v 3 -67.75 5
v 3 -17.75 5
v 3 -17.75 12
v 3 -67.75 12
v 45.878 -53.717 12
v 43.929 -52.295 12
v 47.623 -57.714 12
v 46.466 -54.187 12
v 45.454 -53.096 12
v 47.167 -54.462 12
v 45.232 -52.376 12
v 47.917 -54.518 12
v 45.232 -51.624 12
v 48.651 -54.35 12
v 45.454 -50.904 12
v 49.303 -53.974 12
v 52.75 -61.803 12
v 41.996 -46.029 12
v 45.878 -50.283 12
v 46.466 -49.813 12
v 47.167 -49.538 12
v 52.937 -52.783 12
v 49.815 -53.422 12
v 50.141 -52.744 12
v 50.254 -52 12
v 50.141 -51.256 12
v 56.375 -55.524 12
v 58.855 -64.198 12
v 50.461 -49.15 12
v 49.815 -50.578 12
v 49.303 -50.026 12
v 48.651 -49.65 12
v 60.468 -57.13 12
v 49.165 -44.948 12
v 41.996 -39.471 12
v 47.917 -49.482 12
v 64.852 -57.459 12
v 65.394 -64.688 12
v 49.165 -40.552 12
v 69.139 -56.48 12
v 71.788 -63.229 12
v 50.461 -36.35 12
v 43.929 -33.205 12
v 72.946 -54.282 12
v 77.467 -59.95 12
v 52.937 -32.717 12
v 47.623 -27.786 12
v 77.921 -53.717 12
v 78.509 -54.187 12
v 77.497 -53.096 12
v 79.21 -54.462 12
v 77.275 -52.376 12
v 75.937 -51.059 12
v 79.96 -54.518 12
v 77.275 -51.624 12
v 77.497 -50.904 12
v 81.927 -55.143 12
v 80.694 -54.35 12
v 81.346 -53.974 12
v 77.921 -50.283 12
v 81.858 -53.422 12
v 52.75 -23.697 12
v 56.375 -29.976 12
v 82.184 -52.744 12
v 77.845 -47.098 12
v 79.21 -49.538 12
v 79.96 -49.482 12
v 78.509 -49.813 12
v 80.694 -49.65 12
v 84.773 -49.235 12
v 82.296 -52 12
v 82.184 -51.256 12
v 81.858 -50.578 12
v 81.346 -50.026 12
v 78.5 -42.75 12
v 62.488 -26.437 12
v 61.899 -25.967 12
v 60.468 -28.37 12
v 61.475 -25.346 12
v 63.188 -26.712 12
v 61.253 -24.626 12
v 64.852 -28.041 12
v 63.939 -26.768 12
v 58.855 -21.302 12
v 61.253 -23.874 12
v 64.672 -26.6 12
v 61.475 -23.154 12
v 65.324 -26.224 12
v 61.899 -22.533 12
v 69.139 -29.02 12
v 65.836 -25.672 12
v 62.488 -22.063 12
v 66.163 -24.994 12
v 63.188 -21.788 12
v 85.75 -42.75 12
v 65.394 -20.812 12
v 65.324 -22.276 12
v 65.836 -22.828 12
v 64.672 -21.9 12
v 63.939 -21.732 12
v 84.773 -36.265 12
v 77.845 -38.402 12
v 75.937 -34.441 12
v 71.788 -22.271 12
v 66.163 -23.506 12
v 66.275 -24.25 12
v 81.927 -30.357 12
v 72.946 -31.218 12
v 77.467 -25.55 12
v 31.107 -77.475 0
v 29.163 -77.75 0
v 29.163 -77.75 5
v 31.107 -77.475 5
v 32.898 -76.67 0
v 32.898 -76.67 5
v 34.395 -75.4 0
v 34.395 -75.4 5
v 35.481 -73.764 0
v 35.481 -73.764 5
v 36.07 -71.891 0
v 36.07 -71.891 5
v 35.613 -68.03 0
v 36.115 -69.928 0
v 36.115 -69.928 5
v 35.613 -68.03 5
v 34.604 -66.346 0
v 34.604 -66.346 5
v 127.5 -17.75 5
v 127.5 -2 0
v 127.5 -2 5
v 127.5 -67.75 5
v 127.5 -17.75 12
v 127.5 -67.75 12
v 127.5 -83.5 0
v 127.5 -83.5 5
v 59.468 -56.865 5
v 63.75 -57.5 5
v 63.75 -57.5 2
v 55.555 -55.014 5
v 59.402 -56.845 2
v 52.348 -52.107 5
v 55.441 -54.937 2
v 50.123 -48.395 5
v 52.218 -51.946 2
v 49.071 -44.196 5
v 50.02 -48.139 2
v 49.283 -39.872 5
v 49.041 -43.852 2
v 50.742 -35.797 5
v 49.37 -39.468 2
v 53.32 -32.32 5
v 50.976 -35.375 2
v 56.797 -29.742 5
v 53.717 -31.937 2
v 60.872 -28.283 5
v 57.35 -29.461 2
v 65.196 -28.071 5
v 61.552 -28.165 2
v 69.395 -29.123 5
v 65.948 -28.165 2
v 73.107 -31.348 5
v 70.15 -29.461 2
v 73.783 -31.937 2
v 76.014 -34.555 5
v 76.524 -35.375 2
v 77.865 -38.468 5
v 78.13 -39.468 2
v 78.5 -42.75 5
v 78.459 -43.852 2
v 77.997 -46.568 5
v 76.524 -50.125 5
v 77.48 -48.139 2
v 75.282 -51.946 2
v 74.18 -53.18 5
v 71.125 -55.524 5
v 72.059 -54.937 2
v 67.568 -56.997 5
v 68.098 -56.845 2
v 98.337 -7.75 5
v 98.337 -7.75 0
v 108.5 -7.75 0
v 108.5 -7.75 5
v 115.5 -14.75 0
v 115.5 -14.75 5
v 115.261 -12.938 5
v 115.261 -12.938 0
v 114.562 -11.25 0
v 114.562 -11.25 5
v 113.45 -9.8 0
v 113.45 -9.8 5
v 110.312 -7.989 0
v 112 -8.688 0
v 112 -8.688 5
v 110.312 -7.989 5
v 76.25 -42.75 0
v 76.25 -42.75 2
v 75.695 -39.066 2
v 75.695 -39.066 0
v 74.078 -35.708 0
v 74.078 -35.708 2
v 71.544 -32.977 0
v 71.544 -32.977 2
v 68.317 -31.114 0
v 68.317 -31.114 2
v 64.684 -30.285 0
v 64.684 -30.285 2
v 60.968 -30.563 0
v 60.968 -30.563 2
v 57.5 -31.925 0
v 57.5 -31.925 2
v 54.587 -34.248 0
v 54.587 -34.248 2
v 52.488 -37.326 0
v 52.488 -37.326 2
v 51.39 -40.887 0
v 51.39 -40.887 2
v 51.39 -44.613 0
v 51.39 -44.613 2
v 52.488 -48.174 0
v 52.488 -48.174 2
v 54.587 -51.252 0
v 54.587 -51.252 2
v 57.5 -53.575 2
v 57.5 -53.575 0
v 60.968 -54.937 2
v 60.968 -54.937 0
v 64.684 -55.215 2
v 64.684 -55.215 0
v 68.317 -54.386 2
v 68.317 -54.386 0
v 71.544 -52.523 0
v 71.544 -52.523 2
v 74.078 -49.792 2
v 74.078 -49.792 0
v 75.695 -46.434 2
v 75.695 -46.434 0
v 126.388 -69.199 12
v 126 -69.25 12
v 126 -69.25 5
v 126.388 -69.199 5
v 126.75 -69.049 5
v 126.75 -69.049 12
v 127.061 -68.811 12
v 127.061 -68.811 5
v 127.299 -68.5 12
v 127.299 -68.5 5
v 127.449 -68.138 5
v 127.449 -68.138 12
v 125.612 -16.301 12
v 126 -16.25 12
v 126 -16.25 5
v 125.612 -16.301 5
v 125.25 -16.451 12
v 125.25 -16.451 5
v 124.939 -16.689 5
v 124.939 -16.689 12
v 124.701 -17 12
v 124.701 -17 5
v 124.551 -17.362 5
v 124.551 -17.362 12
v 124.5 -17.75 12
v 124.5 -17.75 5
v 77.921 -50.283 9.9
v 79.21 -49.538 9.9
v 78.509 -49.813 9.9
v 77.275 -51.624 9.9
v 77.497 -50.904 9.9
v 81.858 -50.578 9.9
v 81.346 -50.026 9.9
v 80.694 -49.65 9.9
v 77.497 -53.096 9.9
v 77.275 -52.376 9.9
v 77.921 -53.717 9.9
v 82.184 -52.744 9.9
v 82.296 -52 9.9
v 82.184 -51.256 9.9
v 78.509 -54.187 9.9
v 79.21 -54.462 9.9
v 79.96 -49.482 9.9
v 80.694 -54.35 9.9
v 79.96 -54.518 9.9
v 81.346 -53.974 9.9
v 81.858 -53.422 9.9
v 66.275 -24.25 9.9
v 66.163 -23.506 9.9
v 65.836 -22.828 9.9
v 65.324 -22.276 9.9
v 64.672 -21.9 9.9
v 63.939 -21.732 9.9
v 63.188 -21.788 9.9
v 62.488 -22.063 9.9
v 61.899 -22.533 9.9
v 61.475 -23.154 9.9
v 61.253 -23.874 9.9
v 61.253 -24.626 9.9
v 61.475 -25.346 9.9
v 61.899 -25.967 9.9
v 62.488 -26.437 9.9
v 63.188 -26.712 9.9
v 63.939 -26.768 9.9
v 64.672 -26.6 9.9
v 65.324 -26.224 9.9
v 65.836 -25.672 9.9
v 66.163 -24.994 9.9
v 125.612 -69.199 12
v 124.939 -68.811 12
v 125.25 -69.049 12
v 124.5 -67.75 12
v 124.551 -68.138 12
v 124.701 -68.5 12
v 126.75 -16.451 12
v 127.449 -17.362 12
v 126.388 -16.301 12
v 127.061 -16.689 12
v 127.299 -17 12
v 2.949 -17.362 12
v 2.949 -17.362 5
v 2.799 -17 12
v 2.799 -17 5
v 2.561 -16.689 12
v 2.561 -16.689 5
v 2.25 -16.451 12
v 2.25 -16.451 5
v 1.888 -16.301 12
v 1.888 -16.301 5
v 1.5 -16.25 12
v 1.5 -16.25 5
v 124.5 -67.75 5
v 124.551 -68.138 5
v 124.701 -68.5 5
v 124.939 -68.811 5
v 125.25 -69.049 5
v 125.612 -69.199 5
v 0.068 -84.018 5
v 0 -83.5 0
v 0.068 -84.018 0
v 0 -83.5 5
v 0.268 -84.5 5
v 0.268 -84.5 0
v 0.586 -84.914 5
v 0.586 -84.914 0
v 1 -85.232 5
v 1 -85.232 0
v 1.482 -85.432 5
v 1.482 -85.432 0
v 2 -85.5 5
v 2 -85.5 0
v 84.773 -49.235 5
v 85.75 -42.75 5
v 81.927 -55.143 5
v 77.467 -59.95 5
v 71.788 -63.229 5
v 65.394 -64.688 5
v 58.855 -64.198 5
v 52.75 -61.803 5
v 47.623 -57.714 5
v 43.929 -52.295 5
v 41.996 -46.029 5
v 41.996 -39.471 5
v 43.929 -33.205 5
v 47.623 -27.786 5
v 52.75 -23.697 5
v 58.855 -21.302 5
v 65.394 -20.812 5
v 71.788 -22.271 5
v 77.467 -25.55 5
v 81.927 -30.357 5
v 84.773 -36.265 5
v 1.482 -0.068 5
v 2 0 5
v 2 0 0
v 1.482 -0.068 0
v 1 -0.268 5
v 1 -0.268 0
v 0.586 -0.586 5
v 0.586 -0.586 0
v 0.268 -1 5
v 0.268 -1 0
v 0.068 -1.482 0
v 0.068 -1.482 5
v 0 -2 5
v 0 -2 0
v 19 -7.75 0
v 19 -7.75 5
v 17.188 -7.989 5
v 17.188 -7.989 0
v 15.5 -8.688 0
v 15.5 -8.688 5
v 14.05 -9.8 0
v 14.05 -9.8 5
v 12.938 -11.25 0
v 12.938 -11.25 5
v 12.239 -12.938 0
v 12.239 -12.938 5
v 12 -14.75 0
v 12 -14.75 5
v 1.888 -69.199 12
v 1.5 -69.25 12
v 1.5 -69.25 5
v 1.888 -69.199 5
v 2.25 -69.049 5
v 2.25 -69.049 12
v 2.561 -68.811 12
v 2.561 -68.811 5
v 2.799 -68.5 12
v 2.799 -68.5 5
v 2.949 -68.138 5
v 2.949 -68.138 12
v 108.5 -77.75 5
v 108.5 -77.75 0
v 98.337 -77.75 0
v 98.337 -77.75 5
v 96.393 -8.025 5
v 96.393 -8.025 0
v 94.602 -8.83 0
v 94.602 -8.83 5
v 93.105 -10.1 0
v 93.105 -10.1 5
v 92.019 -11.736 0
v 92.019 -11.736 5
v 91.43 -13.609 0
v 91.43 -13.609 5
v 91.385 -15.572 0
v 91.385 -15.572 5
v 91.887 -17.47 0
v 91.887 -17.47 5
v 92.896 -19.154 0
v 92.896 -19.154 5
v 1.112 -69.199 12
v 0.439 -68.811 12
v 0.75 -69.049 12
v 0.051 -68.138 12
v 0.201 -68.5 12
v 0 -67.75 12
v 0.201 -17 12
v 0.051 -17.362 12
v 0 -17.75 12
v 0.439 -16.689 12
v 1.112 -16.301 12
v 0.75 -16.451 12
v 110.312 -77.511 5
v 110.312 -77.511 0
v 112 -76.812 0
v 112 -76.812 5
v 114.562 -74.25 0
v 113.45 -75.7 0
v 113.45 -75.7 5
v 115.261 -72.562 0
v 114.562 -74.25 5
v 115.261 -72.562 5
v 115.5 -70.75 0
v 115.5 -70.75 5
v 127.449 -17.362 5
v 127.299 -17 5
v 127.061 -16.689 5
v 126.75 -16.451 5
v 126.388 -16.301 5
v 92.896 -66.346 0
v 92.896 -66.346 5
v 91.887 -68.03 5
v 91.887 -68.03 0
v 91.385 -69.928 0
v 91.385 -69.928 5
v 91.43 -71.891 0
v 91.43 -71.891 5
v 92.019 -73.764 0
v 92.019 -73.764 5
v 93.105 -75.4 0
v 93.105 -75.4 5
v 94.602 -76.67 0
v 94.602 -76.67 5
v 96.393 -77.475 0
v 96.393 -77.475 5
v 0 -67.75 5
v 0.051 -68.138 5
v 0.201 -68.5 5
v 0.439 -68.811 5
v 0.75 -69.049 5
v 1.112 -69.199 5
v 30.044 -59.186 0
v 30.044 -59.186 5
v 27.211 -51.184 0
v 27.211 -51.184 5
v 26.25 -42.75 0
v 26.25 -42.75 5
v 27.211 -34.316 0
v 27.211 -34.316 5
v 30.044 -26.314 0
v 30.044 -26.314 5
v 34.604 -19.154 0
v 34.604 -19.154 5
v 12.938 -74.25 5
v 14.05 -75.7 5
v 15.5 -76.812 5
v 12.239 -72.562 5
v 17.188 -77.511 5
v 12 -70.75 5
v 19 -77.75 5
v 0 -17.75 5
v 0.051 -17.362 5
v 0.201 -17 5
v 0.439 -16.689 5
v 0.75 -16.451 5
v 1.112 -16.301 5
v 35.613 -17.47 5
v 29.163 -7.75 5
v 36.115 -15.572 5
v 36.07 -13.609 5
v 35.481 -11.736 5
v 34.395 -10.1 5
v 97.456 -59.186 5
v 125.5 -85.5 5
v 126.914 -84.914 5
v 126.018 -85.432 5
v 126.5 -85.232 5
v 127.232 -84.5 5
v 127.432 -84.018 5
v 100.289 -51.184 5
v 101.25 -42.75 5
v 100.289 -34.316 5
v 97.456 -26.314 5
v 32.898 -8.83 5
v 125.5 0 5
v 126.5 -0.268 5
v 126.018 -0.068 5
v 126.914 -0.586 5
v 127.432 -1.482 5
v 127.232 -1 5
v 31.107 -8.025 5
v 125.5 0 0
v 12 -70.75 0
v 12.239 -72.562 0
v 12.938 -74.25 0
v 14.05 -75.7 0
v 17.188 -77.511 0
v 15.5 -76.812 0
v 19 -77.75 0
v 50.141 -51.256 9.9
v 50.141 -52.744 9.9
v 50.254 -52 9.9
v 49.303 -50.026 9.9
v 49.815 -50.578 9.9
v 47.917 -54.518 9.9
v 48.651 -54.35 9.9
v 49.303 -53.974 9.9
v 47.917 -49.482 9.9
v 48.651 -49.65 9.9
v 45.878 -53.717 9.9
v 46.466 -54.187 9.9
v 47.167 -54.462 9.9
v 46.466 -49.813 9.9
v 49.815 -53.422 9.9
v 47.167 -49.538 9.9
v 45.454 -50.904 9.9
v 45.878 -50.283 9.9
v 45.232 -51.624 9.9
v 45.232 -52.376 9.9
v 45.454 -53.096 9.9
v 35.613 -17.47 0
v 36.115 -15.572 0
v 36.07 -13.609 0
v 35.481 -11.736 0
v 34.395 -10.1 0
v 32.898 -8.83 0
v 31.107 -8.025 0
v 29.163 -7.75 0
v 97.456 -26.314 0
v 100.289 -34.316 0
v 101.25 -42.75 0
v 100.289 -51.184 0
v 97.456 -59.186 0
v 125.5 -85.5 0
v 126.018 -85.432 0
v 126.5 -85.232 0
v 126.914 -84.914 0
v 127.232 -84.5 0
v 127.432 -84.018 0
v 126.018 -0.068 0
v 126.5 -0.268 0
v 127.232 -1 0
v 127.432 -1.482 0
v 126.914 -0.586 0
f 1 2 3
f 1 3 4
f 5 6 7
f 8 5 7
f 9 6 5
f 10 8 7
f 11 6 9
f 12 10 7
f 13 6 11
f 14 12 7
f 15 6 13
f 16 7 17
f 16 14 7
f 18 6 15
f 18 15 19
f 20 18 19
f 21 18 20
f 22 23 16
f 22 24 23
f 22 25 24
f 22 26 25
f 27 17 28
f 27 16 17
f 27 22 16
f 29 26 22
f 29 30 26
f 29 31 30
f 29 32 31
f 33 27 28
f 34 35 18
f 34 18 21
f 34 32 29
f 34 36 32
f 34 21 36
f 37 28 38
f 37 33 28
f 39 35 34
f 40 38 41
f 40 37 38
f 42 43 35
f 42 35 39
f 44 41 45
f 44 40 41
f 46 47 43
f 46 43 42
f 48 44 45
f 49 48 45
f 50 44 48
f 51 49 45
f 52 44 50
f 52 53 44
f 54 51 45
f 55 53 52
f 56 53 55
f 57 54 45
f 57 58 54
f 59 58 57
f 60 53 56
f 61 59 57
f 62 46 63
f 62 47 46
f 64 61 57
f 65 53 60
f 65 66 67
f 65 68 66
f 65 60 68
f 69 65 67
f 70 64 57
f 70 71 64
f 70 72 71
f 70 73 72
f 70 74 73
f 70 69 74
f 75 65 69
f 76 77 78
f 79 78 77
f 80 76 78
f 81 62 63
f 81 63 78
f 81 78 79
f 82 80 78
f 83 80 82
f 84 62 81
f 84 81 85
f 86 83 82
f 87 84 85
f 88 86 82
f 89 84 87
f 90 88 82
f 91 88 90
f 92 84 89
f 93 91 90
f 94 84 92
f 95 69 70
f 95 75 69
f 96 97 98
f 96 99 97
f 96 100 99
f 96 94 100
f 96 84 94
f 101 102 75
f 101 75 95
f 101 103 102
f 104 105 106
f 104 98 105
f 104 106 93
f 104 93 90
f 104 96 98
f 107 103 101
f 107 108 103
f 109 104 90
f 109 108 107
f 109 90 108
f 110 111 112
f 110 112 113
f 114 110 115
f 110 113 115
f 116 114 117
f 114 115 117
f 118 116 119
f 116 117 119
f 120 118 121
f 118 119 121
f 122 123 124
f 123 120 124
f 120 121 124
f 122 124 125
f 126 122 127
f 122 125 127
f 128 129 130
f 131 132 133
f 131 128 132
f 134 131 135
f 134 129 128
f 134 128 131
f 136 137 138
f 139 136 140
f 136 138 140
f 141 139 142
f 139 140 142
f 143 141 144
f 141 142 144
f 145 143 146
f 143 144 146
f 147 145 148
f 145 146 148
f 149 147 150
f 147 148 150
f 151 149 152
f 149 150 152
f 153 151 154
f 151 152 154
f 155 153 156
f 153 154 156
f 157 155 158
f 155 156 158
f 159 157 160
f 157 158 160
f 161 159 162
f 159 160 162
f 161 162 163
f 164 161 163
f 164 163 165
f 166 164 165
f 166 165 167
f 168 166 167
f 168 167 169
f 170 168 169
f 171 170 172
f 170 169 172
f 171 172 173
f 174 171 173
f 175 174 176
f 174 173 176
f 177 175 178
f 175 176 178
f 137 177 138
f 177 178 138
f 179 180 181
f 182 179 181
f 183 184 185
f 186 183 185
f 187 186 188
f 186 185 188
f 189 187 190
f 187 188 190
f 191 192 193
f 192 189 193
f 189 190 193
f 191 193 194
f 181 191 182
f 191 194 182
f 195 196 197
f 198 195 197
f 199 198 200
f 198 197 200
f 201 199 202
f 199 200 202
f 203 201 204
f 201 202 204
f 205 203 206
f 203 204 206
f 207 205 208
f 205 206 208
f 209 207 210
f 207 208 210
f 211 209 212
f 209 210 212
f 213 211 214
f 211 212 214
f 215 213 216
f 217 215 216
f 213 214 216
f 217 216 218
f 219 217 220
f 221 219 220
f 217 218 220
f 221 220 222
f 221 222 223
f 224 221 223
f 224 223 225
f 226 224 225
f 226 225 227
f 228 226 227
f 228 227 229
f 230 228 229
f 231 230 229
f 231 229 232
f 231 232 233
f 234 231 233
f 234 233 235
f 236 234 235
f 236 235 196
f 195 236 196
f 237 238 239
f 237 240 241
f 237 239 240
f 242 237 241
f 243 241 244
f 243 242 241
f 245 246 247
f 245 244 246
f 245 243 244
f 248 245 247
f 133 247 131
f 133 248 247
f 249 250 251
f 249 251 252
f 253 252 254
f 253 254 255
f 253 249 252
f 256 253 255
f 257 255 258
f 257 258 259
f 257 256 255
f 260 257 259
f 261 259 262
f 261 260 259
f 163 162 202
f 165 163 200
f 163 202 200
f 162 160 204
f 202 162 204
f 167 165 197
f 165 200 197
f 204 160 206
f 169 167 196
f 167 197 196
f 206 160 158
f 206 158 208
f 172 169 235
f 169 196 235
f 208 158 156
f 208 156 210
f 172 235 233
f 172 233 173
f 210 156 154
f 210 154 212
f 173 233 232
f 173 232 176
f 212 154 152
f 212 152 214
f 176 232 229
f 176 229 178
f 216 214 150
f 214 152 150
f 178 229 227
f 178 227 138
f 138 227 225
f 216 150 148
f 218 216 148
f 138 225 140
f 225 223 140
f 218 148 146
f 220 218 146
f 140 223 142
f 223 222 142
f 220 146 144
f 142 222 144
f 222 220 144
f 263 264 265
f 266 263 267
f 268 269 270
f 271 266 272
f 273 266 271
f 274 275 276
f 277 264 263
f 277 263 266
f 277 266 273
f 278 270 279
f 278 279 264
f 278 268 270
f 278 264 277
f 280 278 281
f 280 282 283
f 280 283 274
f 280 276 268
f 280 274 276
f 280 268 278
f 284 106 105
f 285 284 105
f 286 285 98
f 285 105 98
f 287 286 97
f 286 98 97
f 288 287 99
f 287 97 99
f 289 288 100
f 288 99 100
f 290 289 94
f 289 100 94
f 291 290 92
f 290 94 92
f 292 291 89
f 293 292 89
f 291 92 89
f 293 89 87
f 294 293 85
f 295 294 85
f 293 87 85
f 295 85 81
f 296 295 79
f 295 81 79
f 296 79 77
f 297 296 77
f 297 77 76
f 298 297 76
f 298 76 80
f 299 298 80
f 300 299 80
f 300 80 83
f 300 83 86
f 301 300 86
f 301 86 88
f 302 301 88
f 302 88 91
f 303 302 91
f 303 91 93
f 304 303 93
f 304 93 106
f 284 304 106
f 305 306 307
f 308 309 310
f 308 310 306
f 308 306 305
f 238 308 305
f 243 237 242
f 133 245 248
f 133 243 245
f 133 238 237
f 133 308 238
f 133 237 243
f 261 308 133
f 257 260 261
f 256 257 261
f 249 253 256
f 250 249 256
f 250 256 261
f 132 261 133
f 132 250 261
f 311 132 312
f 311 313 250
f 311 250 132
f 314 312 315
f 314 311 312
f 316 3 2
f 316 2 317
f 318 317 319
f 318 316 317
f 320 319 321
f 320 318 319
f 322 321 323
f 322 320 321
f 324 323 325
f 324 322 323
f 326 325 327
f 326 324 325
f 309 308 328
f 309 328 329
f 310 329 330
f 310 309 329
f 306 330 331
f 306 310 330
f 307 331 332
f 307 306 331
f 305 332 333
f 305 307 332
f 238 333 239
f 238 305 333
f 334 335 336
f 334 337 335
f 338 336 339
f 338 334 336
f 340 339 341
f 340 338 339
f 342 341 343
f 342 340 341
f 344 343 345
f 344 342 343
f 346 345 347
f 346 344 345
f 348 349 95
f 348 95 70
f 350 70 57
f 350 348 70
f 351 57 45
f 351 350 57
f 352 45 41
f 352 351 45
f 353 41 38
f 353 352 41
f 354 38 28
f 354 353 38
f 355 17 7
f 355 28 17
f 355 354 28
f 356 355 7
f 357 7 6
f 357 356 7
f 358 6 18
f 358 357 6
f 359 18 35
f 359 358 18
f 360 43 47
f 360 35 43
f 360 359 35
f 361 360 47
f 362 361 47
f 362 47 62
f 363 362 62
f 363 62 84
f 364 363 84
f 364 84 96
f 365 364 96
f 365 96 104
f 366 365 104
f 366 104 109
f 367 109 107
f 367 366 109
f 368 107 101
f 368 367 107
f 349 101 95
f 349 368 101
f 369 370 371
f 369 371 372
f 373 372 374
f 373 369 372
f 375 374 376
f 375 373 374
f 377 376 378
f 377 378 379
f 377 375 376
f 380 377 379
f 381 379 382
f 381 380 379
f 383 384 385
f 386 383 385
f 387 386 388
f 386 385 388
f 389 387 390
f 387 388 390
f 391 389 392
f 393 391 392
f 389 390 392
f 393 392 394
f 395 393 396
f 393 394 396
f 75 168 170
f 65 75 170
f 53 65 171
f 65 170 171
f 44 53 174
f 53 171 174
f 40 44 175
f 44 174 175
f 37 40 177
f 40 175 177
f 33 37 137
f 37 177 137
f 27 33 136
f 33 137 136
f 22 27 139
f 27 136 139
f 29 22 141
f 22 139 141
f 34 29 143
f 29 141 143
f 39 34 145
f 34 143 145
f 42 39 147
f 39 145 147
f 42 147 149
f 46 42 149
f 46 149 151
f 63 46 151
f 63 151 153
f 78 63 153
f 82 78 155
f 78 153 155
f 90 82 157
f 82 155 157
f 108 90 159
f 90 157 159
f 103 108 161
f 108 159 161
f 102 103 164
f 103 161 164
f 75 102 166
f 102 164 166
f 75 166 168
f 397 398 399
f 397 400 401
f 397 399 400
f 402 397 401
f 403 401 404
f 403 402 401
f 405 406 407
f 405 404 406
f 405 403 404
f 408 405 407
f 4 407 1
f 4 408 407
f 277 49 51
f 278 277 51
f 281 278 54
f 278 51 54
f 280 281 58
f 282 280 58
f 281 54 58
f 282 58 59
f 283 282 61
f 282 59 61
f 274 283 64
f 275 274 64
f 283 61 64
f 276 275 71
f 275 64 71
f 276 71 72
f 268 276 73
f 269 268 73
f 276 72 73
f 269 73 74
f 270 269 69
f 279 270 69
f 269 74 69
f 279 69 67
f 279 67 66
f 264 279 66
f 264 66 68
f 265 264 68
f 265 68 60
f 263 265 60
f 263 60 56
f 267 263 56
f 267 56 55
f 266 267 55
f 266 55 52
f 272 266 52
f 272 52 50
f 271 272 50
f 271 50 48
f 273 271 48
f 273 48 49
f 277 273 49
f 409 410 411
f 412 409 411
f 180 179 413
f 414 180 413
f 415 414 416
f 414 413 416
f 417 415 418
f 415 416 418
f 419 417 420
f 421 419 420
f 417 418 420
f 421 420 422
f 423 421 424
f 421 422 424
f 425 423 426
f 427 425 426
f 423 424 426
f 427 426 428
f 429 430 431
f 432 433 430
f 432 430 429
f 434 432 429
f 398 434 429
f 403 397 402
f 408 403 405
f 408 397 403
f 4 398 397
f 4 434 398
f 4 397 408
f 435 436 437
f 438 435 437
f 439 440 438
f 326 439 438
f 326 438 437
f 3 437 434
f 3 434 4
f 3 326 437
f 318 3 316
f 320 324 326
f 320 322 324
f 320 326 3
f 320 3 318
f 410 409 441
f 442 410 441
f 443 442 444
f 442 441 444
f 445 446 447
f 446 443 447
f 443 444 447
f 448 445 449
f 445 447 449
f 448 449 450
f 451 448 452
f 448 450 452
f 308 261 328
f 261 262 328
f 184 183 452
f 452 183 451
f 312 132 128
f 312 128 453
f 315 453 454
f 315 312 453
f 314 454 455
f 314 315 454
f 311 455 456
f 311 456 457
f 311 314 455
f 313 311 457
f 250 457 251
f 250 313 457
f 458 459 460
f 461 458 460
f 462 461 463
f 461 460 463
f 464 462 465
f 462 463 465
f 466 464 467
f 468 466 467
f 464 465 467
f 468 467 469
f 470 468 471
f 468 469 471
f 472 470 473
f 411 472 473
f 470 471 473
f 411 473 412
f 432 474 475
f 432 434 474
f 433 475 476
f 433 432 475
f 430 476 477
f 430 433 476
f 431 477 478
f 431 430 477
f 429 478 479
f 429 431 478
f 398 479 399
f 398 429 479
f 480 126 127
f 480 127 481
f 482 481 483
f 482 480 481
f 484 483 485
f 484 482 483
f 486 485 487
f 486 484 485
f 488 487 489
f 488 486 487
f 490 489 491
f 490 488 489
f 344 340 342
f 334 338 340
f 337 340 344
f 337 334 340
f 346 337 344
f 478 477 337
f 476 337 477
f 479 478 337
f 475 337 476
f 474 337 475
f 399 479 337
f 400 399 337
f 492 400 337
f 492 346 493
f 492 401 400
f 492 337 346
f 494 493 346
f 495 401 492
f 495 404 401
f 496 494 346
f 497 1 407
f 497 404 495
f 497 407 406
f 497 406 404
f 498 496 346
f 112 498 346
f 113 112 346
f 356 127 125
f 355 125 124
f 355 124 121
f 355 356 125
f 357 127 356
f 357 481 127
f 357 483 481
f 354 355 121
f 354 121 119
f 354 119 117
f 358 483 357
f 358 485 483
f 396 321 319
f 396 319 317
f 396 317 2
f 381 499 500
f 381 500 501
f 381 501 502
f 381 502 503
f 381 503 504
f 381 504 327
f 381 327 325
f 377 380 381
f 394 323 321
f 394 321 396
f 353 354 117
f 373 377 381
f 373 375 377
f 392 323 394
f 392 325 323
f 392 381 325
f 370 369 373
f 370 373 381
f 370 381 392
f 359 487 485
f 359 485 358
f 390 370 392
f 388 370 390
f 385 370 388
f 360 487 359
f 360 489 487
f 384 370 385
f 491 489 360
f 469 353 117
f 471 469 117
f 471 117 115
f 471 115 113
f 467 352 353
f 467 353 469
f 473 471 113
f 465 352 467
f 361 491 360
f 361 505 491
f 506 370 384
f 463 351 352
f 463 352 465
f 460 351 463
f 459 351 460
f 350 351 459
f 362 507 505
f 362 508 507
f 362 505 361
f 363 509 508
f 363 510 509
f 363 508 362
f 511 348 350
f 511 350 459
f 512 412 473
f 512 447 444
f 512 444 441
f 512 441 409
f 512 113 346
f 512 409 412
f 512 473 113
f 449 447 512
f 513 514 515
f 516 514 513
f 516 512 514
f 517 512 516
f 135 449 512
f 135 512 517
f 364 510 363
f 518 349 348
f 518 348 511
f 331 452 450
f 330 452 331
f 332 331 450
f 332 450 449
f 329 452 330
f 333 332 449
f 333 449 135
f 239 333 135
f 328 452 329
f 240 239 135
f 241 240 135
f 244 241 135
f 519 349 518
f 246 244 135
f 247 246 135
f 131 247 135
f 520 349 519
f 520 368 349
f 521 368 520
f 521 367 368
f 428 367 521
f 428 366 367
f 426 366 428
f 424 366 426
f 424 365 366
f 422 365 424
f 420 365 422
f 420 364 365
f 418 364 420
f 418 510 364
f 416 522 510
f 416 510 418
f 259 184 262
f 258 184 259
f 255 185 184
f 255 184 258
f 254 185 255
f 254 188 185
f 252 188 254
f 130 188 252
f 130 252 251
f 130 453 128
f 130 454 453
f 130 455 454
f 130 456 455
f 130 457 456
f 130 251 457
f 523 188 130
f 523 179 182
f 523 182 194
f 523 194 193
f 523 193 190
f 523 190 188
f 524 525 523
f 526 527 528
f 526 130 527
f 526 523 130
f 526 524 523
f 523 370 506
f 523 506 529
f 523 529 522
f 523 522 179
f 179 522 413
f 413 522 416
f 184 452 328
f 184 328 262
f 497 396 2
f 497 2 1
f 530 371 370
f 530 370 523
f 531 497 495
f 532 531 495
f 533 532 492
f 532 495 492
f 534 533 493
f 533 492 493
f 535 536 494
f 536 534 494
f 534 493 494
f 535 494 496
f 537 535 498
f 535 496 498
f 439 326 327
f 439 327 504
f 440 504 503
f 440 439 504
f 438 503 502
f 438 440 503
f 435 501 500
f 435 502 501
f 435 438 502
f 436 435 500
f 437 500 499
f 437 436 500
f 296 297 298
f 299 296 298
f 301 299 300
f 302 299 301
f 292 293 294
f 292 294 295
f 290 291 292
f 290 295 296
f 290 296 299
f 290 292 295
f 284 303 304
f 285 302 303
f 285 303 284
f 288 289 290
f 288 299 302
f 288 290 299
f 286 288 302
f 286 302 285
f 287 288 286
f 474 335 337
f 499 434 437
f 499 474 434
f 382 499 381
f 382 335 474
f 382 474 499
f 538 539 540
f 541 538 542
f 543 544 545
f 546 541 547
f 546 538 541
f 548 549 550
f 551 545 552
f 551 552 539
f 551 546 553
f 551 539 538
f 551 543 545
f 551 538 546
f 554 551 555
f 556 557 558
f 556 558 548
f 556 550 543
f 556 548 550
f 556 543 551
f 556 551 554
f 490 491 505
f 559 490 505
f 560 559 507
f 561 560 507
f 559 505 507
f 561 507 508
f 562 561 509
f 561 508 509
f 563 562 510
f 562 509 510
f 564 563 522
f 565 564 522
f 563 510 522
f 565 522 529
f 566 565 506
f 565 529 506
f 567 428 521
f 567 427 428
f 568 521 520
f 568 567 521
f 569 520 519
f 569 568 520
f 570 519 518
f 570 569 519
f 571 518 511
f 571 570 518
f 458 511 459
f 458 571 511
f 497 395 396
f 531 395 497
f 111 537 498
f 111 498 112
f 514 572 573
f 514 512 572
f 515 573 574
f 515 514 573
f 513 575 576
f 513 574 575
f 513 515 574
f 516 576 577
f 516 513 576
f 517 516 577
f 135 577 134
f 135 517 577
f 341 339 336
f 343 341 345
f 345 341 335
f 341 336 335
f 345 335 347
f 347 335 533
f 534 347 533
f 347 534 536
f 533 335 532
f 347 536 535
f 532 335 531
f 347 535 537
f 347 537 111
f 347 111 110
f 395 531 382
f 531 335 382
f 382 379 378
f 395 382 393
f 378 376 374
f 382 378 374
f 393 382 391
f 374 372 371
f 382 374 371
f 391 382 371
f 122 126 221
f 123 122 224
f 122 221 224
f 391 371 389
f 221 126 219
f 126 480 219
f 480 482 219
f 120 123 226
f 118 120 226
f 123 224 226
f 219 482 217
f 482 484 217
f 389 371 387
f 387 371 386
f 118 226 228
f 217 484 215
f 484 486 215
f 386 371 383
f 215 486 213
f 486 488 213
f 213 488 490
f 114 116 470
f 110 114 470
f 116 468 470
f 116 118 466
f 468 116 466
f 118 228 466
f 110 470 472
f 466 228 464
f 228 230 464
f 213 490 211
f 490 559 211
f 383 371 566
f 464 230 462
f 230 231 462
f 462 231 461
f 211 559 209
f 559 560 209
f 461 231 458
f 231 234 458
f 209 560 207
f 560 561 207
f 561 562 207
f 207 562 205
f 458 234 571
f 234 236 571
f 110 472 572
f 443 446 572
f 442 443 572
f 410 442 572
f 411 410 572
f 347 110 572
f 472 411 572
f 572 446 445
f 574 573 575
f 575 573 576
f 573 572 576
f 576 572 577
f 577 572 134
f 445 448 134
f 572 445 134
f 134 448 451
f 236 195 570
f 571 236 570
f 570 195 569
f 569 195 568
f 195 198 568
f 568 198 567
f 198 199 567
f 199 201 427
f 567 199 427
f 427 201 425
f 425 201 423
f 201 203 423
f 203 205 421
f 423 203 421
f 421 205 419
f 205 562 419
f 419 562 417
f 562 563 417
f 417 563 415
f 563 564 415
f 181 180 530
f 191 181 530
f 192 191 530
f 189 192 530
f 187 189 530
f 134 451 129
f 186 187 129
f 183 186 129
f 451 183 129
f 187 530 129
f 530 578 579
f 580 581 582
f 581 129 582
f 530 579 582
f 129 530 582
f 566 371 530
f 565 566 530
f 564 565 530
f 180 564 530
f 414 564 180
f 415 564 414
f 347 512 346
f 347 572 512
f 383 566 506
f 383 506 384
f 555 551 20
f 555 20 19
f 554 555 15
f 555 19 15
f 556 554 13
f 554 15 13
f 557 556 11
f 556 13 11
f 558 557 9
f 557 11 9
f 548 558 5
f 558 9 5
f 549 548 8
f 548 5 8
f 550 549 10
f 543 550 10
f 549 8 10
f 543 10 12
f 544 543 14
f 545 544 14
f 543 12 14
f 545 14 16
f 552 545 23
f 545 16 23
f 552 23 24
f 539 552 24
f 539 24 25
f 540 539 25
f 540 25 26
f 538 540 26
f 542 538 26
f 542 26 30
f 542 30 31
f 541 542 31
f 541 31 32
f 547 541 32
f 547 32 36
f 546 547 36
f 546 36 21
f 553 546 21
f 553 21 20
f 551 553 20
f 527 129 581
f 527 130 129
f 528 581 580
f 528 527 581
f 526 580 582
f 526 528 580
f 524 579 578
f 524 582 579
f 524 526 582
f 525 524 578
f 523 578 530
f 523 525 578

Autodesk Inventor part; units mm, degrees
ref_plane "YZ Plane" through (0, 0, 0) normal (1, 0, 0) x (0, 1, 0)
ref_plane "XZ Plane" through (0, 0, 0) normal (0, 1, 0) x (-1, 0, 0)
ref_plane "XY Plane" through (0, 0, 0) normal (0, 0, 1) x (1, 0, 0)
sketch "Skizze1" plane through (0, 0, 0) normal (0, 0, 1) x (1, 0, 0)
  line L0 (0, 0) -> (127.5, 0)
  line L1 (127.5, 0) -> (127.5, -85.5)
  line L2 (127.5, -85.5) -> (0, -85.5)
  line L3 (0, -85.5) -> (0, 0)
  dimension "d0" = 127.5
  dimension "d1" = 85.5
extrude "Extrusion1" add sketch "Skizze1" along normal blind 5
sketch "Skizze2" plane through (0, 0, 5) normal (0, 0, 1) x (1, 0, 0)
  line L0 (0, -16.25) -> (3, -16.25)
  line L1 (3, -16.25) -> (3, -69.25)
  line L2 (3, -69.25) -> (0, -69.25)
  line L3 (0, -69.25) -> (0, -16.25)
  line L4 (63.75, 42.9175) -> (63.75, -147.2432)
  line L5 (127.5, -85.5) -> (127.5, 0) projected
  line L6 (127.5, -16.25) -> (124.5, -16.25)
  line L7 (124.5, -16.25) -> (124.5, -69.25)
  line L8 (124.5, -69.25) -> (127.5, -69.25)
  line L9 (127.5, -69.25) -> (127.5, -16.25)
  point P0 (0, 0)
  dimension "d4" = 3
  dimension "d5" = 53
  dimension "d6" = 16.25
  dimension "d7" = 63.75
extrude "Extrusion2" add sketch "Skizze2" along normal blind 7
fillet "Rundung1" radius 2 4 edges at (0, 0, 2.5) (127.5, 0, 2.5) (127.5, -85.5, 2.5) (0, -85.5, 2.5)
fillet "Rundung2" radius 1.5 8 edges at (3, -69.25, 8.5) (0, -69.25, 8.5) (3, -16.25, 8.5) (0, -16.25, 8.5) (124.5, -16.25, 8.5) (127.5, -16.25, 8.5) (124.5, -69.25, 8.5) (127.5, -69.25, 8.5)
sketch "Skizze3" plane through (0, 0, 5) normal (0, 0, 1) x (1, 0, 0)
  circle A0 centre (63.75, -42.75) radius 12.5
  line L0 (0, -67.75) -> (0, -83.5) projected
  point P0 (0, 0)
  dimension "d12" = 25
  dimension "d13" = 63.75
  dimension "d14" = 42.75
extrude "Extrusion3" cut sketch "Skizze3" against normal blind 10
hole "Bohrung1" at (63.75, -42.75, 5) direction (0, 0, -1) diameter 29.5 depth 3
sketch "Skizze4" plane through (0, 0, 0) normal (0, 0, -1) x (-1, 0, 0)
  line L0 (-125.5, -85.5) -> (-2, -85.5) projected
  line L1 (0, -83.5) -> (0, -2) projected
  line L2 (-12, -77.75) -> (-50.2871, -77.75)
  line L3 (-50.2871, -7.75) -> (-12, -7.75)
  line L4 (-12, -7.75) -> (-12, -77.75)
  line L5 (-63.75, -42.75) -> (-63.75, -99.3052)
  line L6 (-115.5, -77.75) -> (-77.2129, -77.75)
  line L7 (-77.2129, -7.75) -> (-115.5, -7.75)
  line L8 (-115.5, -7.75) -> (-115.5, -77.75)
  arc A0 (-50.2871, -77.75) -> (-50.2871, -7.75) centre (-63.75, -42.75) ccw
  arc A1 (-77.2129, -7.75) -> (-77.2129, -77.75) centre (-63.75, -42.75) ccw
  arc A2 (-50.2871, -77.75) -> (-50.2871, -7.75) centre (-63.75, -42.75) ccw
  arc A3 (-77.2129, -7.75) -> (-77.2129, -77.75) centre (-63.75, -42.75) ccw
  point P0 (0, 0)
  dimension "d27" = 42.75
  dimension "d28" = 63.75
  dimension "d29" = 12
  dimension "d30" = 70
  dimension "d31" = 7.75
extrude "Extrusion4" cut sketch "Skizze4" against normal blind 10
fillet "Rundung3" radius 7 4 edges at (50.2871, -77.75, 2.5) (77.2129, -77.75, 2.5) (50.2871, -7.75, 2.5) (77.2129, -7.75, 2.5)
fillet "Rundung4" radius 7 4 edges at (12, -77.75, 2.5) (115.5, -77.75, 2.5) (12, -7.75, 2.5) (115.5, -7.75, 2.5)
sketch "Skizze5" plane through (0, 0, 5) normal (0, 0, 1) x (1, 0, 0)
  circle A0 centre (63.75, -42.75) radius 14.75
  circle A1 centre (63.75, -42.75) radius 22
  line L0 (125.5, 0) -> (2, 0) projected
  point P0 (0, 0)
  dimension "d36" = 29.5
  dimension "d37" = 44
  dimension "d38" = 42.75
  dimension "d39" = 63.75
extrude "Extrusion5" add sketch "Skizze5" along normal blind 7
sketch "Skizze6" plane through (63.75, -42.75, 12) normal (0, 0, 1) x (1, 0, 0)
  circle A0 centre (0, 18.5) radius 2.525
  circle A1 centre (0, 0) radius 12.5 projected
  point P0 (-63.75, 42.75)
  dimension "d42" = 5.05
  dimension "d43" = 18.5
extrude "Extrusion6" cut sketch "Skizze6" against normal blind 2.1 contours A0
pattern_circular "Runde Anordnung1" count 3 over 360 about axis through (63.75, -42.75, 5) along (0, 0, 1) of "Extrusion6"
properties part number "Sensor Halterung293"
